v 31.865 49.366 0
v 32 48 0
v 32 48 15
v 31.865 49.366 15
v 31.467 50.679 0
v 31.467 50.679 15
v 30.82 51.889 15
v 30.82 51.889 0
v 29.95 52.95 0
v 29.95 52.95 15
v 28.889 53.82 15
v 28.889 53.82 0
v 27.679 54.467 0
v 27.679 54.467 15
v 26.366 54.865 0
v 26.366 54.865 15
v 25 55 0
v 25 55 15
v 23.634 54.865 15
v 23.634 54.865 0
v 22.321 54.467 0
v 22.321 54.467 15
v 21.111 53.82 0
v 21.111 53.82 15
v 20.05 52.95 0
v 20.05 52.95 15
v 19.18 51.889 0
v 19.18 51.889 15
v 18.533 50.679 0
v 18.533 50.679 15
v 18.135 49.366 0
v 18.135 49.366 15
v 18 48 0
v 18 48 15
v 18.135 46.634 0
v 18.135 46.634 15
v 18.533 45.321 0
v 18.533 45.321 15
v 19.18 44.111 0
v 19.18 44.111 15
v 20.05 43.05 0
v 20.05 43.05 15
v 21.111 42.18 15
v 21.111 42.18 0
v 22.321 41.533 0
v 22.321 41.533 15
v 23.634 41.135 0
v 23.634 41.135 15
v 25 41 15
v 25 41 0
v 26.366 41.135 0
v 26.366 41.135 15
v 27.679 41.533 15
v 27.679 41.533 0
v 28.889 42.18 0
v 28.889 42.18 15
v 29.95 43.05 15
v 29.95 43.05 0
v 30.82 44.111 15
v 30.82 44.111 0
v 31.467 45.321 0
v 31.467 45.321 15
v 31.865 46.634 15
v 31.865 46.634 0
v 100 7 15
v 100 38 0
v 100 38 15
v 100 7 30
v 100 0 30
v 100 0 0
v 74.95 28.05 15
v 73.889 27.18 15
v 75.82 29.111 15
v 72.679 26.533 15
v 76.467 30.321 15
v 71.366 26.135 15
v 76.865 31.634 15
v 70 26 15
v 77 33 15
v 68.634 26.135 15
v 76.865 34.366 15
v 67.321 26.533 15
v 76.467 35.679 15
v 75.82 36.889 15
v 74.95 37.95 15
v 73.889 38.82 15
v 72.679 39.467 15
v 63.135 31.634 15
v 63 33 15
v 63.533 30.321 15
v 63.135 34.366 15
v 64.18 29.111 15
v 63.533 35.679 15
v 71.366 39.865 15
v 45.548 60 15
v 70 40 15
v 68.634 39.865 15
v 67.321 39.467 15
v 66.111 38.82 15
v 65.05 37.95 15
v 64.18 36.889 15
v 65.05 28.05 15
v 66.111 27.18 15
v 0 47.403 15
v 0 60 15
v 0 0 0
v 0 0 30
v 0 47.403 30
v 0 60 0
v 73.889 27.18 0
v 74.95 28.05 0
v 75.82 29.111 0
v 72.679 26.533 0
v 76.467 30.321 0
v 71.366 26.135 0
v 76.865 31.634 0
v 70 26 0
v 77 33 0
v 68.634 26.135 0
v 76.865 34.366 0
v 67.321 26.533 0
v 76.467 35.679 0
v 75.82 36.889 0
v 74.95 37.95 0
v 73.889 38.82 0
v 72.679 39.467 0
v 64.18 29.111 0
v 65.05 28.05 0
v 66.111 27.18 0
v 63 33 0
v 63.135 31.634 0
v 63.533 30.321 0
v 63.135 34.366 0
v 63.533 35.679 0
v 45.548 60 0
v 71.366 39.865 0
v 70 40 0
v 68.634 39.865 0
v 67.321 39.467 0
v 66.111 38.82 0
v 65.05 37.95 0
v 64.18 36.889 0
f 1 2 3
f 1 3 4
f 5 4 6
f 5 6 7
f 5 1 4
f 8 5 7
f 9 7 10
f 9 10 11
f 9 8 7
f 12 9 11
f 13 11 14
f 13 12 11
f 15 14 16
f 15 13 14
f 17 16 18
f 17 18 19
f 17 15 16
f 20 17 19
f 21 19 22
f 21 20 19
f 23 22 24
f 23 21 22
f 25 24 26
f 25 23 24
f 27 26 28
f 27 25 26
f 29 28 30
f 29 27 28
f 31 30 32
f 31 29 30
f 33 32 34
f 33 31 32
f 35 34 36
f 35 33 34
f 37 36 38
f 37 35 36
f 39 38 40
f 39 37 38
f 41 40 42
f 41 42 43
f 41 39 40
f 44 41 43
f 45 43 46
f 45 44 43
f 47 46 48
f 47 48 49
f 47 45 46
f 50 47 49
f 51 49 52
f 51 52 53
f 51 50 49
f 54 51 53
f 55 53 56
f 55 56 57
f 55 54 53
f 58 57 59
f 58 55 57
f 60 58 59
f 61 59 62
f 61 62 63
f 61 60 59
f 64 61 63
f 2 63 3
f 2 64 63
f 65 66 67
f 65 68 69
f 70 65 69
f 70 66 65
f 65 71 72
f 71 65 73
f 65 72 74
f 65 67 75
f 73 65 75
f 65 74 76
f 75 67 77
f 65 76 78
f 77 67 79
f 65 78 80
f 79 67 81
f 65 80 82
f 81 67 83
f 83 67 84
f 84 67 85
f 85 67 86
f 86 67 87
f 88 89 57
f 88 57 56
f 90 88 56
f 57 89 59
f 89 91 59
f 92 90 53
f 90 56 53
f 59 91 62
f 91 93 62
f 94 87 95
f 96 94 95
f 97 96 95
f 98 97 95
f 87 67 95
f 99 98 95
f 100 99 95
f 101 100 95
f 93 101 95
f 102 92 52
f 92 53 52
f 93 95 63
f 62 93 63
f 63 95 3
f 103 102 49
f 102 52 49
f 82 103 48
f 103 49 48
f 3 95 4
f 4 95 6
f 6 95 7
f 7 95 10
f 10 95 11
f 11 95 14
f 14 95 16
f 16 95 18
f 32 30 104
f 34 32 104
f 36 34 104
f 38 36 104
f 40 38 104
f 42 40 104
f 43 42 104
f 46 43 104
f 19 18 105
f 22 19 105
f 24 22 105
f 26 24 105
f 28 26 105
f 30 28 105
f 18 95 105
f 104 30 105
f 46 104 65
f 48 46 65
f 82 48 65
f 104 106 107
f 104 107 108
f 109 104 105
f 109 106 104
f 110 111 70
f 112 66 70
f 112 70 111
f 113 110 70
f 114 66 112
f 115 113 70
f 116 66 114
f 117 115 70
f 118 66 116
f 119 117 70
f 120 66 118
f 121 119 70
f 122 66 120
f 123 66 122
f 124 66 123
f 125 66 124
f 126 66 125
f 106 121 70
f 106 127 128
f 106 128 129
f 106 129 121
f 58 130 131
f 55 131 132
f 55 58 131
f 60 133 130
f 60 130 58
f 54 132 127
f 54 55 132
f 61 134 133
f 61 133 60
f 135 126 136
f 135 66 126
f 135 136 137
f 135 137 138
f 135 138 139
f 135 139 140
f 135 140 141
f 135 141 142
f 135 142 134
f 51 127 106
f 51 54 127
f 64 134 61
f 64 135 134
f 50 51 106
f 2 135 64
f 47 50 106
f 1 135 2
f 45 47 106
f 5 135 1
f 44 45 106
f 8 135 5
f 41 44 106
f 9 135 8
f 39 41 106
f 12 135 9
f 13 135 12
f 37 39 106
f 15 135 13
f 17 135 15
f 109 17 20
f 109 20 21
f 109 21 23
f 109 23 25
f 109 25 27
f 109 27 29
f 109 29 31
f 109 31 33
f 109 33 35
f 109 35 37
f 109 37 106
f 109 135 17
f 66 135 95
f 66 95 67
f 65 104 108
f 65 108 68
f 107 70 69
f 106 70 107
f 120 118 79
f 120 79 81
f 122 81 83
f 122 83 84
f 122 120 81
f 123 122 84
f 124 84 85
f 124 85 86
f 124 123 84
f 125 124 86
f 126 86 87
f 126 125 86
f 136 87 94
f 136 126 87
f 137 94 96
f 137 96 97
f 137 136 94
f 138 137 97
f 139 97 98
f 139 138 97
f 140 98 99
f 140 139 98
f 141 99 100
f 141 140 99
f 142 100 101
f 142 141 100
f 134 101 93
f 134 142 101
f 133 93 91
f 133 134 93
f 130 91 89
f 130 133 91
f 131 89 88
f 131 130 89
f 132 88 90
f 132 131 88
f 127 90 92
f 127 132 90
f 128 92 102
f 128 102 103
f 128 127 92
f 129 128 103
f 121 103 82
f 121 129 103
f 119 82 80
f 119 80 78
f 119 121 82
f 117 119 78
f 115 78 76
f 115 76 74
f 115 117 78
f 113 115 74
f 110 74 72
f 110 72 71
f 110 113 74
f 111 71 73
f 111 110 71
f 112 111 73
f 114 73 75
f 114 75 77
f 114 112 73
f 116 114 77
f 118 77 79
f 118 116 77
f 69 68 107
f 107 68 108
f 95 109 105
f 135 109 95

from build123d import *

# Parameters (mm, degrees)
BOSS_EXTRUDE1_DEPTH = 30
SKETCH1_3_R         = 7
BOSS_EXTRUDE2_DEPTH = 15


with BuildPart() as part:
    # Sketch1 → Boss-Extrude1 (new body)
    with BuildSketch(Plane.XY):
        Polygon((0, 47.402622584), (0, 0), (100, 0), (100, 7), align=None)
    extrude(amount=BOSS_EXTRUDE1_DEPTH)

    # Sketch1<3> → Boss-Extrude2 (add)
    with BuildSketch(Plane.XY):
        Polygon((0, 60), (0, 47.402622584), (100, 7), (100, 38), (45.548089225, 60), align=None)
        with Locations((25, 48)):
            Circle(SKETCH1_3_R, mode=Mode.SUBTRACT)
        with Locations((70, 33)):
            Circle(SKETCH1_3_R, mode=Mode.SUBTRACT)
    extrude(amount=BOSS_EXTRUDE2_DEPTH)


solid = part.part
